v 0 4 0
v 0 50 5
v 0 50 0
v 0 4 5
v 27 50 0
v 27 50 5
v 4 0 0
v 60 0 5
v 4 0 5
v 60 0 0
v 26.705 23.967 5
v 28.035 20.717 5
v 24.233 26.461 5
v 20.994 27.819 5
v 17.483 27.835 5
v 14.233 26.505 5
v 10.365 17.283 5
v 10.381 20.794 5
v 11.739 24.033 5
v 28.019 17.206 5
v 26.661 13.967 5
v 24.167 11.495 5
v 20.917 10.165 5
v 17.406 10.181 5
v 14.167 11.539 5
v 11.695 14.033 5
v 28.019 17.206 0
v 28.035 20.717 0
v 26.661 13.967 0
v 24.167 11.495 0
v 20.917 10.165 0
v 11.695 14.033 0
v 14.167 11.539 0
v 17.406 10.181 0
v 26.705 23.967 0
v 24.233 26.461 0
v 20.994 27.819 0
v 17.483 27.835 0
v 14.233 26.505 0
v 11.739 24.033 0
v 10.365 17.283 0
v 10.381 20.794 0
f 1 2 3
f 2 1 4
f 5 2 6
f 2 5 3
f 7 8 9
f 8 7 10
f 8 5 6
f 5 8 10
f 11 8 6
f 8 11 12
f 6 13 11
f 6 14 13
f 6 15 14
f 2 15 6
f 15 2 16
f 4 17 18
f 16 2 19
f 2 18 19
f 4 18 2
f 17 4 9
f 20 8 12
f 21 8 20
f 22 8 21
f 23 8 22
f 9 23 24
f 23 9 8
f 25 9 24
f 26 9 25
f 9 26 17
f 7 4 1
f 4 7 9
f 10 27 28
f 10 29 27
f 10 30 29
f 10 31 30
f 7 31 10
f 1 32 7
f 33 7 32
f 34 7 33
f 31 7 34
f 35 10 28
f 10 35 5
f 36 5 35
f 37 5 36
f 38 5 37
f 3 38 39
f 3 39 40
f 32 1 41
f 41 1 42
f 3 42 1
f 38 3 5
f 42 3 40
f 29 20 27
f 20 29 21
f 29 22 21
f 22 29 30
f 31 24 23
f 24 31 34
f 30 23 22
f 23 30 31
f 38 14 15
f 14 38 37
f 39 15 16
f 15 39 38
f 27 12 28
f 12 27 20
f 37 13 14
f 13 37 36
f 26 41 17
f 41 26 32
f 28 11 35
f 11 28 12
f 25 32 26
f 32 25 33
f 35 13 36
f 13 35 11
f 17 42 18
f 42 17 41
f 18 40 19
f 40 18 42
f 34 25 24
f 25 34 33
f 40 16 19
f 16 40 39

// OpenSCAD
$fn = 32;

// ----------------------------------------------------------------------
// Bracket plate: gusset 60 x 50
// ----------------------------------------------------------------------

// --- parameters (mm) ---
hole_r = 3;               // bolt hole radius
plate_t = 5;              // plate thickness, Z (extrusion height)
gus_a = 60;               // base length
gus_b = 50;               // height
top_x = 27;               // top edge X of the angled cut
light_r = 9;              // lightening hole radius

light_d = 2 * light_r;

profile = [[4, 0], [30, 0], [60, 0], [27, 50], [0, 50], [0, 4]];  // primary outline, 6 points, counter clockwise
void_1 = [[28.035, 20.717], [26.705, 23.967], [24.233, 26.461], [20.994, 27.819], [17.483, 27.835], [14.233, 26.505], [11.739, 24.033], [10.381, 20.794], [10.365, 17.283], [11.695, 14.033], [14.167, 11.539], [17.406, 10.181], [20.917, 10.165], [24.167, 11.495], [26.661, 13.967], [28.019, 17.206]];  // lightening hole, 16 points

// --- the one profile operation ---
difference() {
  linear_extrude(height = plate_t) polygon(points = profile);
  translate([0, 0, -1])
    linear_extrude(height = plate_t + 2) polygon(points = void_1);
}
